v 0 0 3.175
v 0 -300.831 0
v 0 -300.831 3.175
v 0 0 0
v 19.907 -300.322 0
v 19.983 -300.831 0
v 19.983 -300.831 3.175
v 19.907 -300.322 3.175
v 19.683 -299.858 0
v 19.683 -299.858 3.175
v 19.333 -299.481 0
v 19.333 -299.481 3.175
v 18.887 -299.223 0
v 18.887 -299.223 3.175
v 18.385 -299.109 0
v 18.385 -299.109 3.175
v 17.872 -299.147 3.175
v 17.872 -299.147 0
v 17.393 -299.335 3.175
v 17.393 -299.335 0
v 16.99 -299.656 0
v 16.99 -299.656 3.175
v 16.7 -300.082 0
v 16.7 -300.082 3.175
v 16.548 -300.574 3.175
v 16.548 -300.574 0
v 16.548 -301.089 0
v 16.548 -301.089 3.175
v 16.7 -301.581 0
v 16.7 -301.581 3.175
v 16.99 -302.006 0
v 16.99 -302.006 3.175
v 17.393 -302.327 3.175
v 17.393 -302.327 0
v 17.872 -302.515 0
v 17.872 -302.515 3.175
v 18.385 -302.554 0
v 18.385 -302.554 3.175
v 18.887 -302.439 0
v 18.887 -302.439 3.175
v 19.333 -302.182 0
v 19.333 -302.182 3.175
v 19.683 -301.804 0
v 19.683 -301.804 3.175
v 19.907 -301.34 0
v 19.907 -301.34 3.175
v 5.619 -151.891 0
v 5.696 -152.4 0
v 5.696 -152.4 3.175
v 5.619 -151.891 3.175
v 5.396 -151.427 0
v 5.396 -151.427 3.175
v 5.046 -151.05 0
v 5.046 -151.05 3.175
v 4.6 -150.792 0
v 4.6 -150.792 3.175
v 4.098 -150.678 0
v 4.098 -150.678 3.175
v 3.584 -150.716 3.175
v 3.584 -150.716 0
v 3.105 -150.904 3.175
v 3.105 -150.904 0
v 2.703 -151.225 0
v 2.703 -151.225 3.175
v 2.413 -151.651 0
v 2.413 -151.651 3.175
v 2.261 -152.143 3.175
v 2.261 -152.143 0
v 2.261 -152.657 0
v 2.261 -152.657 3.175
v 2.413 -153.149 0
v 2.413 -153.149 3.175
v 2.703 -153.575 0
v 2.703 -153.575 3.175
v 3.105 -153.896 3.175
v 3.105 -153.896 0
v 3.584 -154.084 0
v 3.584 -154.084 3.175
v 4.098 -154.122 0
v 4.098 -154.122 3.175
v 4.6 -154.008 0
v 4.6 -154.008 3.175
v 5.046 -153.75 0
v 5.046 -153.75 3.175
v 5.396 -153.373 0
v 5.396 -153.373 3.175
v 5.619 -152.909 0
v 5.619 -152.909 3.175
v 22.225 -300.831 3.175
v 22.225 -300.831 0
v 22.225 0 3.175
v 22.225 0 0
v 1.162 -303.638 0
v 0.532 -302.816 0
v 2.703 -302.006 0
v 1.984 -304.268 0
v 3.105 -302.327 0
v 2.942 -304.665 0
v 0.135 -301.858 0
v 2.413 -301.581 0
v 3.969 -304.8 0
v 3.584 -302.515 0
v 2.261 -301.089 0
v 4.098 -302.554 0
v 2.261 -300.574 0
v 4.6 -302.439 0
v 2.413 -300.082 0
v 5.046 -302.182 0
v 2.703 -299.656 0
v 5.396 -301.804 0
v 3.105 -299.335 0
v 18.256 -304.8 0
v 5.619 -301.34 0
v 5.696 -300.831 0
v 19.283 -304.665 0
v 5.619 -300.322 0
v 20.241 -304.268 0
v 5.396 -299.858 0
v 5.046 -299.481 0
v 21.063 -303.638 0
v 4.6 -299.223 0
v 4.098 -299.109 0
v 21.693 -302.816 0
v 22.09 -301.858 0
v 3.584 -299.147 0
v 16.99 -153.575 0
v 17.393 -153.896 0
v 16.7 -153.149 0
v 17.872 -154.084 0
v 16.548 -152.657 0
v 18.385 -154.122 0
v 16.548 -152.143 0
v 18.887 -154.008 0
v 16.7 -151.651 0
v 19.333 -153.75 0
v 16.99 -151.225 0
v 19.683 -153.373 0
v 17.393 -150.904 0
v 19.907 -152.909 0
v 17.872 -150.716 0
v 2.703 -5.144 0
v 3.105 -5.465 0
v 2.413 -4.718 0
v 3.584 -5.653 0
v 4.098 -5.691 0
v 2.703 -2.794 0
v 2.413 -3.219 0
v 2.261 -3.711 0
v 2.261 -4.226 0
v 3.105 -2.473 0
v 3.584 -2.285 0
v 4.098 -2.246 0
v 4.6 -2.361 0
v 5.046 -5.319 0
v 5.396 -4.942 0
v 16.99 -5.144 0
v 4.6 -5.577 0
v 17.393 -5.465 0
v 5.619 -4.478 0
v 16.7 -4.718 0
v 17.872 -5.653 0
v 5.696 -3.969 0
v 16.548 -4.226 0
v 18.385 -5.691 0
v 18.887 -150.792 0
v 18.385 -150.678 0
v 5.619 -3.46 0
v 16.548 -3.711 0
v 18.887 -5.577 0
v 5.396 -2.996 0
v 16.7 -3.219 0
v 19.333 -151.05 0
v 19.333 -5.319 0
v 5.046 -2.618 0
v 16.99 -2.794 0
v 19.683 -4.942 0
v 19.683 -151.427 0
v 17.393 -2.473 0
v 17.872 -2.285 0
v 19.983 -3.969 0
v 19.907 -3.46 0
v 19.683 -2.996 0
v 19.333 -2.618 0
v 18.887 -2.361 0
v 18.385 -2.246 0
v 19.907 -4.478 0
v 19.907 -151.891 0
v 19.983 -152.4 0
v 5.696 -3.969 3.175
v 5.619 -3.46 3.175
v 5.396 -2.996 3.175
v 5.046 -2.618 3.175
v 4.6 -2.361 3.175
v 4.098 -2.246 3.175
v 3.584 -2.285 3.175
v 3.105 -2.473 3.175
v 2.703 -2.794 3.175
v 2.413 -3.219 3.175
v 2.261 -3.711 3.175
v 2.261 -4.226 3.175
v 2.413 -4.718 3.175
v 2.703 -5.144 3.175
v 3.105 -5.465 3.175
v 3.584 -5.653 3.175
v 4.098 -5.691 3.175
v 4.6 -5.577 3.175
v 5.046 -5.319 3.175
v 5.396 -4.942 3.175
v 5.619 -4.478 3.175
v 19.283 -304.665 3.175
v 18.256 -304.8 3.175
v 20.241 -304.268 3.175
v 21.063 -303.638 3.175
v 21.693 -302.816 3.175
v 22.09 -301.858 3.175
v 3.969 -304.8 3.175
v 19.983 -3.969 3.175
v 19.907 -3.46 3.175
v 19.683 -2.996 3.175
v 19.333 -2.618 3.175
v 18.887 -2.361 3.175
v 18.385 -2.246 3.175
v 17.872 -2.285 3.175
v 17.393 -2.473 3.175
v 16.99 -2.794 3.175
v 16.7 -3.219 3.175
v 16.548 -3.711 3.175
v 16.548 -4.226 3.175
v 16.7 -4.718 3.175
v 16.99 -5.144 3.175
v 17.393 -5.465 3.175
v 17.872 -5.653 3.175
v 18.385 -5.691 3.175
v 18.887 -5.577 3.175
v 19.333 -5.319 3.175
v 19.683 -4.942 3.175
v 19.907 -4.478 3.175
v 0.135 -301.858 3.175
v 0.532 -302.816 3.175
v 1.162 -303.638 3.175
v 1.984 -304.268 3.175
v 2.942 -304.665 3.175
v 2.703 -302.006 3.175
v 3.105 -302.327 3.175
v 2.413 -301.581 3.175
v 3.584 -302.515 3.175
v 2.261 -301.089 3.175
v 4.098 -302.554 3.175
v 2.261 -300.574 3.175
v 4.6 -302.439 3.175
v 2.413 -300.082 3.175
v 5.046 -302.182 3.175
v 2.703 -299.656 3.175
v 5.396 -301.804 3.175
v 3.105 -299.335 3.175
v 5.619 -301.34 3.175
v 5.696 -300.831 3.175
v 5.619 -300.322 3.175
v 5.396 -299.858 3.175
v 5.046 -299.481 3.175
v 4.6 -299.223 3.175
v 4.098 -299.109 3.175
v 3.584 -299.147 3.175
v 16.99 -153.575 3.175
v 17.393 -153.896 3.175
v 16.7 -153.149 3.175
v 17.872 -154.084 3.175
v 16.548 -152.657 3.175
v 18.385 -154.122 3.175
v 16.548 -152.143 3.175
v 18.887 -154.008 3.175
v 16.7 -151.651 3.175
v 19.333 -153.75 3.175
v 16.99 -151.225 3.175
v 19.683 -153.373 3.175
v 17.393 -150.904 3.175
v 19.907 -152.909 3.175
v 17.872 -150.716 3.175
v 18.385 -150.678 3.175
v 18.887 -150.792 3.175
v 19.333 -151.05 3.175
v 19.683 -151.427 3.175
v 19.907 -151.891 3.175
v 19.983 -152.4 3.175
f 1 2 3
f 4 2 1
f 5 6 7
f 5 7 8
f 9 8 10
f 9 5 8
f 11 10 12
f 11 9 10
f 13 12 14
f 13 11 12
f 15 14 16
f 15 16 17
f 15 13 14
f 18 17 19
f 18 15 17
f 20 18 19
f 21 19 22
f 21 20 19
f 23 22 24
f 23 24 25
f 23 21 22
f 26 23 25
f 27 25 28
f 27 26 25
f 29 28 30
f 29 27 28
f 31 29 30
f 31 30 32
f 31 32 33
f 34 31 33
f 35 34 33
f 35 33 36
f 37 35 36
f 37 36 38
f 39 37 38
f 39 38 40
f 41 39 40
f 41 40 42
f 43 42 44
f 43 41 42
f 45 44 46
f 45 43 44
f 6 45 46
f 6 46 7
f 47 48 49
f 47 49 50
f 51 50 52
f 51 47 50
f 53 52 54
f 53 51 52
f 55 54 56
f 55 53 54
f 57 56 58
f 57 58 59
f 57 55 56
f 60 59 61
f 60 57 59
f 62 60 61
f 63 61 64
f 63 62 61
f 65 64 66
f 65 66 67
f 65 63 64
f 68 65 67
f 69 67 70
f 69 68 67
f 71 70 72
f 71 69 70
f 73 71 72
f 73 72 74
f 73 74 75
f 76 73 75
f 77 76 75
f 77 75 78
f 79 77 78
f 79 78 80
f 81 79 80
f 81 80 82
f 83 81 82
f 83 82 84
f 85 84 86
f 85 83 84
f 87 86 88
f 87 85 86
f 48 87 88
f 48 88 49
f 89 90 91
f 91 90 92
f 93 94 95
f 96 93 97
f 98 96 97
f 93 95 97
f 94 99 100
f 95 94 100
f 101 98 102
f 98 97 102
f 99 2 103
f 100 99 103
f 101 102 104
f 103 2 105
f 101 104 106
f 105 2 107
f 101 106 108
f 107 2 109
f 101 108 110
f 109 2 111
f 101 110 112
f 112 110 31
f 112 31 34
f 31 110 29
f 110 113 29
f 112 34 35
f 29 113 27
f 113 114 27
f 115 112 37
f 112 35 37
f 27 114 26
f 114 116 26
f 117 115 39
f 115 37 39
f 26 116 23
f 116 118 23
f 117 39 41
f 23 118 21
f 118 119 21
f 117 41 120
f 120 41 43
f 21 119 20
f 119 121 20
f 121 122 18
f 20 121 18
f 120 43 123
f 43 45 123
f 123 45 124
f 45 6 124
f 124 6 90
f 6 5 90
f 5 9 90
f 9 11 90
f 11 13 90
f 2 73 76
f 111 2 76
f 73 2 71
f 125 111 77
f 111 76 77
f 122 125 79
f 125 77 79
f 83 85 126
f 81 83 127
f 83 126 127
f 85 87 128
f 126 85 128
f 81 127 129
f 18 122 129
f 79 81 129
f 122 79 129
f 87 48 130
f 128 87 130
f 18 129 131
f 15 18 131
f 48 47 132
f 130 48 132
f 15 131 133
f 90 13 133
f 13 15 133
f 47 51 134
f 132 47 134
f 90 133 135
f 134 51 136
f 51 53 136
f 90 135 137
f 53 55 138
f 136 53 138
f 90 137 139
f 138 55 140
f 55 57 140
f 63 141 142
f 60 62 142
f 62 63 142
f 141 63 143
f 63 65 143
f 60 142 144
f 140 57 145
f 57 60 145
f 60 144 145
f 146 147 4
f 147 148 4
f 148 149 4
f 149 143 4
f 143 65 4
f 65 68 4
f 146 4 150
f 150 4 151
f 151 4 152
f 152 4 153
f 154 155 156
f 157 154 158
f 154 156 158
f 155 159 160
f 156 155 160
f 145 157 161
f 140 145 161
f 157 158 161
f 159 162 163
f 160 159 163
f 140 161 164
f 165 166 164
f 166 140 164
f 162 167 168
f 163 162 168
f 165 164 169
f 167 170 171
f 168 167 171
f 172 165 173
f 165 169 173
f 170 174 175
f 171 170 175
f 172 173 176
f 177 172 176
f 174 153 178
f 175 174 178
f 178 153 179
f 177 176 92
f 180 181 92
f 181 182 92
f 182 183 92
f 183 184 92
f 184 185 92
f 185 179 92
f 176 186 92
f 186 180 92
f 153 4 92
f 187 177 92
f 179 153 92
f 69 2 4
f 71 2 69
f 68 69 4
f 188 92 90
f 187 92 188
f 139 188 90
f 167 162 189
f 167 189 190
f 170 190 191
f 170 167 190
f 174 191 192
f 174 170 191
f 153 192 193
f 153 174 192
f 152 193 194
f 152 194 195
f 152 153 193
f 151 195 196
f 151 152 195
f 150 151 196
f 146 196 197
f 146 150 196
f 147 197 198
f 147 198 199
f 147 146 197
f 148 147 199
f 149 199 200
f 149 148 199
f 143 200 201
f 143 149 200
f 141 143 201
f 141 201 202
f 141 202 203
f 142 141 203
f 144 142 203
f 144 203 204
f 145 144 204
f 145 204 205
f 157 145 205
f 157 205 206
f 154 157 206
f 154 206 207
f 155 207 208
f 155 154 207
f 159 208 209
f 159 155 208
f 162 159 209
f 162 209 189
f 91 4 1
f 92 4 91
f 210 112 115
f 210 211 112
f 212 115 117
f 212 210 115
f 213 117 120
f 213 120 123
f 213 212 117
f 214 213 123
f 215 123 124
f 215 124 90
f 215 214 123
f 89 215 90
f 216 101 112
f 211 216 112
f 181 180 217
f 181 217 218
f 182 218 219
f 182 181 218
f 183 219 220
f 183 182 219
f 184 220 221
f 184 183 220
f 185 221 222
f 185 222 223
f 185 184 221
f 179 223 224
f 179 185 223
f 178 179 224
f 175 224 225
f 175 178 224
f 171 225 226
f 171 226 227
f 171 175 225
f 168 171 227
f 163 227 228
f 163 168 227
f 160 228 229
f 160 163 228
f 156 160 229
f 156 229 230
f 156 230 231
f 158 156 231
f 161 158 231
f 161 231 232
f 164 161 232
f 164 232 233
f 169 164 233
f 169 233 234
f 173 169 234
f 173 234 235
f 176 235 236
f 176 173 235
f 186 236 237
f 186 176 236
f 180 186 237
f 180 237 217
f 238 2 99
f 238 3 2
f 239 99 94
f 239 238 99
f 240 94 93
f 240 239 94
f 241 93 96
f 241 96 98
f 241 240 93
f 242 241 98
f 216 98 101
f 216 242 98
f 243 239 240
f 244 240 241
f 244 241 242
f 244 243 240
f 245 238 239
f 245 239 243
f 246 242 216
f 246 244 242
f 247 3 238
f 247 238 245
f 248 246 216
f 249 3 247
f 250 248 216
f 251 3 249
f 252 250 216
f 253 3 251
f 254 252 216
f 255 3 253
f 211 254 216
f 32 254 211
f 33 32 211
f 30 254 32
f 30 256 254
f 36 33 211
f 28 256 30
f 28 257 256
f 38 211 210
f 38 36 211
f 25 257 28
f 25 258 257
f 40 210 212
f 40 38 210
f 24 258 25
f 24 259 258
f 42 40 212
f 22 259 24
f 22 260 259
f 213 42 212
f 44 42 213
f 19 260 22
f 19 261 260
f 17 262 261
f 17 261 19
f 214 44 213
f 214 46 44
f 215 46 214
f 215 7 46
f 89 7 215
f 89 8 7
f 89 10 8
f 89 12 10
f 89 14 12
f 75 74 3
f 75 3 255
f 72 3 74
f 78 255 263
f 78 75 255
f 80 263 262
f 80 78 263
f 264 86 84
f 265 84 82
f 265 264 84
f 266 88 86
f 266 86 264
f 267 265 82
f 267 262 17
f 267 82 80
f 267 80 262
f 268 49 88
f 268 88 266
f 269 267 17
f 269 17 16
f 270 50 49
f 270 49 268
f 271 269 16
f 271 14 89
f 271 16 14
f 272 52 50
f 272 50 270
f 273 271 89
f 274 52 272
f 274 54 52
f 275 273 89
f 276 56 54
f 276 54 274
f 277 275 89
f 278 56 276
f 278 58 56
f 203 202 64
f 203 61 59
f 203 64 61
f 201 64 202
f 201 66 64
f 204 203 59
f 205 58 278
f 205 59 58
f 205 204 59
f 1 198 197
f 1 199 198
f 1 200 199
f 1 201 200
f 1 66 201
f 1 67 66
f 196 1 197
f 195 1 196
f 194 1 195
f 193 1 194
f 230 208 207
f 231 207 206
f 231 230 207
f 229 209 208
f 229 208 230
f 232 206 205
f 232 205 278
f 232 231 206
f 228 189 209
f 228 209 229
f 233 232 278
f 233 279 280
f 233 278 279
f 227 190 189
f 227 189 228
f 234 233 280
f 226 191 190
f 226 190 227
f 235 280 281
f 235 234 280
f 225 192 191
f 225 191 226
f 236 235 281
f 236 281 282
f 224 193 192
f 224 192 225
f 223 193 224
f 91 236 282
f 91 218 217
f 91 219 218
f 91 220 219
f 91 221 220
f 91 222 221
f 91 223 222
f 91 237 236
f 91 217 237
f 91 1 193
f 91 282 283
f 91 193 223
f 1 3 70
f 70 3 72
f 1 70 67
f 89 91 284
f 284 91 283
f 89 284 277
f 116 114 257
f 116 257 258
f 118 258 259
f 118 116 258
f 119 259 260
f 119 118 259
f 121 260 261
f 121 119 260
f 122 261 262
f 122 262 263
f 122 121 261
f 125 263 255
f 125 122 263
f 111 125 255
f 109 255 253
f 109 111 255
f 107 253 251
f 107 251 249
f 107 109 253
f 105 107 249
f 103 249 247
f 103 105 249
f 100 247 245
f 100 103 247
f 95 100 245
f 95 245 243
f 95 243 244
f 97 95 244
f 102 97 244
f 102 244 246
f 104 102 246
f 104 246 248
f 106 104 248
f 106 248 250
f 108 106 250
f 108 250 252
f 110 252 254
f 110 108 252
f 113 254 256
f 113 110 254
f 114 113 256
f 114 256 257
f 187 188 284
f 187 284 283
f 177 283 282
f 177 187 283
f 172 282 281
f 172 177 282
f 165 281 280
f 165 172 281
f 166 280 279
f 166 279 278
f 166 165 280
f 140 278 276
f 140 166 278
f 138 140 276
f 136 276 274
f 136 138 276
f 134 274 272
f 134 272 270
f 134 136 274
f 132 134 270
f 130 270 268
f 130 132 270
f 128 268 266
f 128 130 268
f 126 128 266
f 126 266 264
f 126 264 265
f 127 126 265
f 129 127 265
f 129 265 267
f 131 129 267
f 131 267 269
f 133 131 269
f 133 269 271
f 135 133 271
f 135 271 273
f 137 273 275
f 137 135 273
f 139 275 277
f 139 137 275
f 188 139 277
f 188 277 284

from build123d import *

# Parameters (mm, degrees)
F0_W     = 22.225
F0_H     = 304.8
F0_R     = 1.7272
F1_DEPTH = 3.175
F2_R     = 3.96875


with BuildPart() as f1:
    # F0 (on Top) → F1 (new body)
    with BuildSketch(Plane.XY):
        with Locations((11.1125, -152.4)):
            Rectangle(F0_W, F0_H)
        with Locations((3.96875, -300.83125)):
            Circle(F0_R, mode=Mode.SUBTRACT)
        with Locations((18.25625, -300.83125)):
            Circle(F0_R, mode=Mode.SUBTRACT)
        with Locations((3.96875, -152.4)):
            Circle(F0_R, mode=Mode.SUBTRACT)
        with Locations((3.96875, -3.96875)):
            Circle(F0_R, mode=Mode.SUBTRACT)
        with Locations((18.25625, -152.4)):
            Circle(F0_R, mode=Mode.SUBTRACT)
        with Locations((18.25625, -3.96875)):
            Circle(F0_R, mode=Mode.SUBTRACT)
    extrude(amount=F1_DEPTH)

    # F2
    f2_edges = [f1.edges().sort_by_distance(p)[0] for p in [
        (0, -304.8, 1.5875),
        (22.225, -304.8, 1.5875),
    ]]
    fillet(f2_edges, radius=F2_R)


solid = f1.part
